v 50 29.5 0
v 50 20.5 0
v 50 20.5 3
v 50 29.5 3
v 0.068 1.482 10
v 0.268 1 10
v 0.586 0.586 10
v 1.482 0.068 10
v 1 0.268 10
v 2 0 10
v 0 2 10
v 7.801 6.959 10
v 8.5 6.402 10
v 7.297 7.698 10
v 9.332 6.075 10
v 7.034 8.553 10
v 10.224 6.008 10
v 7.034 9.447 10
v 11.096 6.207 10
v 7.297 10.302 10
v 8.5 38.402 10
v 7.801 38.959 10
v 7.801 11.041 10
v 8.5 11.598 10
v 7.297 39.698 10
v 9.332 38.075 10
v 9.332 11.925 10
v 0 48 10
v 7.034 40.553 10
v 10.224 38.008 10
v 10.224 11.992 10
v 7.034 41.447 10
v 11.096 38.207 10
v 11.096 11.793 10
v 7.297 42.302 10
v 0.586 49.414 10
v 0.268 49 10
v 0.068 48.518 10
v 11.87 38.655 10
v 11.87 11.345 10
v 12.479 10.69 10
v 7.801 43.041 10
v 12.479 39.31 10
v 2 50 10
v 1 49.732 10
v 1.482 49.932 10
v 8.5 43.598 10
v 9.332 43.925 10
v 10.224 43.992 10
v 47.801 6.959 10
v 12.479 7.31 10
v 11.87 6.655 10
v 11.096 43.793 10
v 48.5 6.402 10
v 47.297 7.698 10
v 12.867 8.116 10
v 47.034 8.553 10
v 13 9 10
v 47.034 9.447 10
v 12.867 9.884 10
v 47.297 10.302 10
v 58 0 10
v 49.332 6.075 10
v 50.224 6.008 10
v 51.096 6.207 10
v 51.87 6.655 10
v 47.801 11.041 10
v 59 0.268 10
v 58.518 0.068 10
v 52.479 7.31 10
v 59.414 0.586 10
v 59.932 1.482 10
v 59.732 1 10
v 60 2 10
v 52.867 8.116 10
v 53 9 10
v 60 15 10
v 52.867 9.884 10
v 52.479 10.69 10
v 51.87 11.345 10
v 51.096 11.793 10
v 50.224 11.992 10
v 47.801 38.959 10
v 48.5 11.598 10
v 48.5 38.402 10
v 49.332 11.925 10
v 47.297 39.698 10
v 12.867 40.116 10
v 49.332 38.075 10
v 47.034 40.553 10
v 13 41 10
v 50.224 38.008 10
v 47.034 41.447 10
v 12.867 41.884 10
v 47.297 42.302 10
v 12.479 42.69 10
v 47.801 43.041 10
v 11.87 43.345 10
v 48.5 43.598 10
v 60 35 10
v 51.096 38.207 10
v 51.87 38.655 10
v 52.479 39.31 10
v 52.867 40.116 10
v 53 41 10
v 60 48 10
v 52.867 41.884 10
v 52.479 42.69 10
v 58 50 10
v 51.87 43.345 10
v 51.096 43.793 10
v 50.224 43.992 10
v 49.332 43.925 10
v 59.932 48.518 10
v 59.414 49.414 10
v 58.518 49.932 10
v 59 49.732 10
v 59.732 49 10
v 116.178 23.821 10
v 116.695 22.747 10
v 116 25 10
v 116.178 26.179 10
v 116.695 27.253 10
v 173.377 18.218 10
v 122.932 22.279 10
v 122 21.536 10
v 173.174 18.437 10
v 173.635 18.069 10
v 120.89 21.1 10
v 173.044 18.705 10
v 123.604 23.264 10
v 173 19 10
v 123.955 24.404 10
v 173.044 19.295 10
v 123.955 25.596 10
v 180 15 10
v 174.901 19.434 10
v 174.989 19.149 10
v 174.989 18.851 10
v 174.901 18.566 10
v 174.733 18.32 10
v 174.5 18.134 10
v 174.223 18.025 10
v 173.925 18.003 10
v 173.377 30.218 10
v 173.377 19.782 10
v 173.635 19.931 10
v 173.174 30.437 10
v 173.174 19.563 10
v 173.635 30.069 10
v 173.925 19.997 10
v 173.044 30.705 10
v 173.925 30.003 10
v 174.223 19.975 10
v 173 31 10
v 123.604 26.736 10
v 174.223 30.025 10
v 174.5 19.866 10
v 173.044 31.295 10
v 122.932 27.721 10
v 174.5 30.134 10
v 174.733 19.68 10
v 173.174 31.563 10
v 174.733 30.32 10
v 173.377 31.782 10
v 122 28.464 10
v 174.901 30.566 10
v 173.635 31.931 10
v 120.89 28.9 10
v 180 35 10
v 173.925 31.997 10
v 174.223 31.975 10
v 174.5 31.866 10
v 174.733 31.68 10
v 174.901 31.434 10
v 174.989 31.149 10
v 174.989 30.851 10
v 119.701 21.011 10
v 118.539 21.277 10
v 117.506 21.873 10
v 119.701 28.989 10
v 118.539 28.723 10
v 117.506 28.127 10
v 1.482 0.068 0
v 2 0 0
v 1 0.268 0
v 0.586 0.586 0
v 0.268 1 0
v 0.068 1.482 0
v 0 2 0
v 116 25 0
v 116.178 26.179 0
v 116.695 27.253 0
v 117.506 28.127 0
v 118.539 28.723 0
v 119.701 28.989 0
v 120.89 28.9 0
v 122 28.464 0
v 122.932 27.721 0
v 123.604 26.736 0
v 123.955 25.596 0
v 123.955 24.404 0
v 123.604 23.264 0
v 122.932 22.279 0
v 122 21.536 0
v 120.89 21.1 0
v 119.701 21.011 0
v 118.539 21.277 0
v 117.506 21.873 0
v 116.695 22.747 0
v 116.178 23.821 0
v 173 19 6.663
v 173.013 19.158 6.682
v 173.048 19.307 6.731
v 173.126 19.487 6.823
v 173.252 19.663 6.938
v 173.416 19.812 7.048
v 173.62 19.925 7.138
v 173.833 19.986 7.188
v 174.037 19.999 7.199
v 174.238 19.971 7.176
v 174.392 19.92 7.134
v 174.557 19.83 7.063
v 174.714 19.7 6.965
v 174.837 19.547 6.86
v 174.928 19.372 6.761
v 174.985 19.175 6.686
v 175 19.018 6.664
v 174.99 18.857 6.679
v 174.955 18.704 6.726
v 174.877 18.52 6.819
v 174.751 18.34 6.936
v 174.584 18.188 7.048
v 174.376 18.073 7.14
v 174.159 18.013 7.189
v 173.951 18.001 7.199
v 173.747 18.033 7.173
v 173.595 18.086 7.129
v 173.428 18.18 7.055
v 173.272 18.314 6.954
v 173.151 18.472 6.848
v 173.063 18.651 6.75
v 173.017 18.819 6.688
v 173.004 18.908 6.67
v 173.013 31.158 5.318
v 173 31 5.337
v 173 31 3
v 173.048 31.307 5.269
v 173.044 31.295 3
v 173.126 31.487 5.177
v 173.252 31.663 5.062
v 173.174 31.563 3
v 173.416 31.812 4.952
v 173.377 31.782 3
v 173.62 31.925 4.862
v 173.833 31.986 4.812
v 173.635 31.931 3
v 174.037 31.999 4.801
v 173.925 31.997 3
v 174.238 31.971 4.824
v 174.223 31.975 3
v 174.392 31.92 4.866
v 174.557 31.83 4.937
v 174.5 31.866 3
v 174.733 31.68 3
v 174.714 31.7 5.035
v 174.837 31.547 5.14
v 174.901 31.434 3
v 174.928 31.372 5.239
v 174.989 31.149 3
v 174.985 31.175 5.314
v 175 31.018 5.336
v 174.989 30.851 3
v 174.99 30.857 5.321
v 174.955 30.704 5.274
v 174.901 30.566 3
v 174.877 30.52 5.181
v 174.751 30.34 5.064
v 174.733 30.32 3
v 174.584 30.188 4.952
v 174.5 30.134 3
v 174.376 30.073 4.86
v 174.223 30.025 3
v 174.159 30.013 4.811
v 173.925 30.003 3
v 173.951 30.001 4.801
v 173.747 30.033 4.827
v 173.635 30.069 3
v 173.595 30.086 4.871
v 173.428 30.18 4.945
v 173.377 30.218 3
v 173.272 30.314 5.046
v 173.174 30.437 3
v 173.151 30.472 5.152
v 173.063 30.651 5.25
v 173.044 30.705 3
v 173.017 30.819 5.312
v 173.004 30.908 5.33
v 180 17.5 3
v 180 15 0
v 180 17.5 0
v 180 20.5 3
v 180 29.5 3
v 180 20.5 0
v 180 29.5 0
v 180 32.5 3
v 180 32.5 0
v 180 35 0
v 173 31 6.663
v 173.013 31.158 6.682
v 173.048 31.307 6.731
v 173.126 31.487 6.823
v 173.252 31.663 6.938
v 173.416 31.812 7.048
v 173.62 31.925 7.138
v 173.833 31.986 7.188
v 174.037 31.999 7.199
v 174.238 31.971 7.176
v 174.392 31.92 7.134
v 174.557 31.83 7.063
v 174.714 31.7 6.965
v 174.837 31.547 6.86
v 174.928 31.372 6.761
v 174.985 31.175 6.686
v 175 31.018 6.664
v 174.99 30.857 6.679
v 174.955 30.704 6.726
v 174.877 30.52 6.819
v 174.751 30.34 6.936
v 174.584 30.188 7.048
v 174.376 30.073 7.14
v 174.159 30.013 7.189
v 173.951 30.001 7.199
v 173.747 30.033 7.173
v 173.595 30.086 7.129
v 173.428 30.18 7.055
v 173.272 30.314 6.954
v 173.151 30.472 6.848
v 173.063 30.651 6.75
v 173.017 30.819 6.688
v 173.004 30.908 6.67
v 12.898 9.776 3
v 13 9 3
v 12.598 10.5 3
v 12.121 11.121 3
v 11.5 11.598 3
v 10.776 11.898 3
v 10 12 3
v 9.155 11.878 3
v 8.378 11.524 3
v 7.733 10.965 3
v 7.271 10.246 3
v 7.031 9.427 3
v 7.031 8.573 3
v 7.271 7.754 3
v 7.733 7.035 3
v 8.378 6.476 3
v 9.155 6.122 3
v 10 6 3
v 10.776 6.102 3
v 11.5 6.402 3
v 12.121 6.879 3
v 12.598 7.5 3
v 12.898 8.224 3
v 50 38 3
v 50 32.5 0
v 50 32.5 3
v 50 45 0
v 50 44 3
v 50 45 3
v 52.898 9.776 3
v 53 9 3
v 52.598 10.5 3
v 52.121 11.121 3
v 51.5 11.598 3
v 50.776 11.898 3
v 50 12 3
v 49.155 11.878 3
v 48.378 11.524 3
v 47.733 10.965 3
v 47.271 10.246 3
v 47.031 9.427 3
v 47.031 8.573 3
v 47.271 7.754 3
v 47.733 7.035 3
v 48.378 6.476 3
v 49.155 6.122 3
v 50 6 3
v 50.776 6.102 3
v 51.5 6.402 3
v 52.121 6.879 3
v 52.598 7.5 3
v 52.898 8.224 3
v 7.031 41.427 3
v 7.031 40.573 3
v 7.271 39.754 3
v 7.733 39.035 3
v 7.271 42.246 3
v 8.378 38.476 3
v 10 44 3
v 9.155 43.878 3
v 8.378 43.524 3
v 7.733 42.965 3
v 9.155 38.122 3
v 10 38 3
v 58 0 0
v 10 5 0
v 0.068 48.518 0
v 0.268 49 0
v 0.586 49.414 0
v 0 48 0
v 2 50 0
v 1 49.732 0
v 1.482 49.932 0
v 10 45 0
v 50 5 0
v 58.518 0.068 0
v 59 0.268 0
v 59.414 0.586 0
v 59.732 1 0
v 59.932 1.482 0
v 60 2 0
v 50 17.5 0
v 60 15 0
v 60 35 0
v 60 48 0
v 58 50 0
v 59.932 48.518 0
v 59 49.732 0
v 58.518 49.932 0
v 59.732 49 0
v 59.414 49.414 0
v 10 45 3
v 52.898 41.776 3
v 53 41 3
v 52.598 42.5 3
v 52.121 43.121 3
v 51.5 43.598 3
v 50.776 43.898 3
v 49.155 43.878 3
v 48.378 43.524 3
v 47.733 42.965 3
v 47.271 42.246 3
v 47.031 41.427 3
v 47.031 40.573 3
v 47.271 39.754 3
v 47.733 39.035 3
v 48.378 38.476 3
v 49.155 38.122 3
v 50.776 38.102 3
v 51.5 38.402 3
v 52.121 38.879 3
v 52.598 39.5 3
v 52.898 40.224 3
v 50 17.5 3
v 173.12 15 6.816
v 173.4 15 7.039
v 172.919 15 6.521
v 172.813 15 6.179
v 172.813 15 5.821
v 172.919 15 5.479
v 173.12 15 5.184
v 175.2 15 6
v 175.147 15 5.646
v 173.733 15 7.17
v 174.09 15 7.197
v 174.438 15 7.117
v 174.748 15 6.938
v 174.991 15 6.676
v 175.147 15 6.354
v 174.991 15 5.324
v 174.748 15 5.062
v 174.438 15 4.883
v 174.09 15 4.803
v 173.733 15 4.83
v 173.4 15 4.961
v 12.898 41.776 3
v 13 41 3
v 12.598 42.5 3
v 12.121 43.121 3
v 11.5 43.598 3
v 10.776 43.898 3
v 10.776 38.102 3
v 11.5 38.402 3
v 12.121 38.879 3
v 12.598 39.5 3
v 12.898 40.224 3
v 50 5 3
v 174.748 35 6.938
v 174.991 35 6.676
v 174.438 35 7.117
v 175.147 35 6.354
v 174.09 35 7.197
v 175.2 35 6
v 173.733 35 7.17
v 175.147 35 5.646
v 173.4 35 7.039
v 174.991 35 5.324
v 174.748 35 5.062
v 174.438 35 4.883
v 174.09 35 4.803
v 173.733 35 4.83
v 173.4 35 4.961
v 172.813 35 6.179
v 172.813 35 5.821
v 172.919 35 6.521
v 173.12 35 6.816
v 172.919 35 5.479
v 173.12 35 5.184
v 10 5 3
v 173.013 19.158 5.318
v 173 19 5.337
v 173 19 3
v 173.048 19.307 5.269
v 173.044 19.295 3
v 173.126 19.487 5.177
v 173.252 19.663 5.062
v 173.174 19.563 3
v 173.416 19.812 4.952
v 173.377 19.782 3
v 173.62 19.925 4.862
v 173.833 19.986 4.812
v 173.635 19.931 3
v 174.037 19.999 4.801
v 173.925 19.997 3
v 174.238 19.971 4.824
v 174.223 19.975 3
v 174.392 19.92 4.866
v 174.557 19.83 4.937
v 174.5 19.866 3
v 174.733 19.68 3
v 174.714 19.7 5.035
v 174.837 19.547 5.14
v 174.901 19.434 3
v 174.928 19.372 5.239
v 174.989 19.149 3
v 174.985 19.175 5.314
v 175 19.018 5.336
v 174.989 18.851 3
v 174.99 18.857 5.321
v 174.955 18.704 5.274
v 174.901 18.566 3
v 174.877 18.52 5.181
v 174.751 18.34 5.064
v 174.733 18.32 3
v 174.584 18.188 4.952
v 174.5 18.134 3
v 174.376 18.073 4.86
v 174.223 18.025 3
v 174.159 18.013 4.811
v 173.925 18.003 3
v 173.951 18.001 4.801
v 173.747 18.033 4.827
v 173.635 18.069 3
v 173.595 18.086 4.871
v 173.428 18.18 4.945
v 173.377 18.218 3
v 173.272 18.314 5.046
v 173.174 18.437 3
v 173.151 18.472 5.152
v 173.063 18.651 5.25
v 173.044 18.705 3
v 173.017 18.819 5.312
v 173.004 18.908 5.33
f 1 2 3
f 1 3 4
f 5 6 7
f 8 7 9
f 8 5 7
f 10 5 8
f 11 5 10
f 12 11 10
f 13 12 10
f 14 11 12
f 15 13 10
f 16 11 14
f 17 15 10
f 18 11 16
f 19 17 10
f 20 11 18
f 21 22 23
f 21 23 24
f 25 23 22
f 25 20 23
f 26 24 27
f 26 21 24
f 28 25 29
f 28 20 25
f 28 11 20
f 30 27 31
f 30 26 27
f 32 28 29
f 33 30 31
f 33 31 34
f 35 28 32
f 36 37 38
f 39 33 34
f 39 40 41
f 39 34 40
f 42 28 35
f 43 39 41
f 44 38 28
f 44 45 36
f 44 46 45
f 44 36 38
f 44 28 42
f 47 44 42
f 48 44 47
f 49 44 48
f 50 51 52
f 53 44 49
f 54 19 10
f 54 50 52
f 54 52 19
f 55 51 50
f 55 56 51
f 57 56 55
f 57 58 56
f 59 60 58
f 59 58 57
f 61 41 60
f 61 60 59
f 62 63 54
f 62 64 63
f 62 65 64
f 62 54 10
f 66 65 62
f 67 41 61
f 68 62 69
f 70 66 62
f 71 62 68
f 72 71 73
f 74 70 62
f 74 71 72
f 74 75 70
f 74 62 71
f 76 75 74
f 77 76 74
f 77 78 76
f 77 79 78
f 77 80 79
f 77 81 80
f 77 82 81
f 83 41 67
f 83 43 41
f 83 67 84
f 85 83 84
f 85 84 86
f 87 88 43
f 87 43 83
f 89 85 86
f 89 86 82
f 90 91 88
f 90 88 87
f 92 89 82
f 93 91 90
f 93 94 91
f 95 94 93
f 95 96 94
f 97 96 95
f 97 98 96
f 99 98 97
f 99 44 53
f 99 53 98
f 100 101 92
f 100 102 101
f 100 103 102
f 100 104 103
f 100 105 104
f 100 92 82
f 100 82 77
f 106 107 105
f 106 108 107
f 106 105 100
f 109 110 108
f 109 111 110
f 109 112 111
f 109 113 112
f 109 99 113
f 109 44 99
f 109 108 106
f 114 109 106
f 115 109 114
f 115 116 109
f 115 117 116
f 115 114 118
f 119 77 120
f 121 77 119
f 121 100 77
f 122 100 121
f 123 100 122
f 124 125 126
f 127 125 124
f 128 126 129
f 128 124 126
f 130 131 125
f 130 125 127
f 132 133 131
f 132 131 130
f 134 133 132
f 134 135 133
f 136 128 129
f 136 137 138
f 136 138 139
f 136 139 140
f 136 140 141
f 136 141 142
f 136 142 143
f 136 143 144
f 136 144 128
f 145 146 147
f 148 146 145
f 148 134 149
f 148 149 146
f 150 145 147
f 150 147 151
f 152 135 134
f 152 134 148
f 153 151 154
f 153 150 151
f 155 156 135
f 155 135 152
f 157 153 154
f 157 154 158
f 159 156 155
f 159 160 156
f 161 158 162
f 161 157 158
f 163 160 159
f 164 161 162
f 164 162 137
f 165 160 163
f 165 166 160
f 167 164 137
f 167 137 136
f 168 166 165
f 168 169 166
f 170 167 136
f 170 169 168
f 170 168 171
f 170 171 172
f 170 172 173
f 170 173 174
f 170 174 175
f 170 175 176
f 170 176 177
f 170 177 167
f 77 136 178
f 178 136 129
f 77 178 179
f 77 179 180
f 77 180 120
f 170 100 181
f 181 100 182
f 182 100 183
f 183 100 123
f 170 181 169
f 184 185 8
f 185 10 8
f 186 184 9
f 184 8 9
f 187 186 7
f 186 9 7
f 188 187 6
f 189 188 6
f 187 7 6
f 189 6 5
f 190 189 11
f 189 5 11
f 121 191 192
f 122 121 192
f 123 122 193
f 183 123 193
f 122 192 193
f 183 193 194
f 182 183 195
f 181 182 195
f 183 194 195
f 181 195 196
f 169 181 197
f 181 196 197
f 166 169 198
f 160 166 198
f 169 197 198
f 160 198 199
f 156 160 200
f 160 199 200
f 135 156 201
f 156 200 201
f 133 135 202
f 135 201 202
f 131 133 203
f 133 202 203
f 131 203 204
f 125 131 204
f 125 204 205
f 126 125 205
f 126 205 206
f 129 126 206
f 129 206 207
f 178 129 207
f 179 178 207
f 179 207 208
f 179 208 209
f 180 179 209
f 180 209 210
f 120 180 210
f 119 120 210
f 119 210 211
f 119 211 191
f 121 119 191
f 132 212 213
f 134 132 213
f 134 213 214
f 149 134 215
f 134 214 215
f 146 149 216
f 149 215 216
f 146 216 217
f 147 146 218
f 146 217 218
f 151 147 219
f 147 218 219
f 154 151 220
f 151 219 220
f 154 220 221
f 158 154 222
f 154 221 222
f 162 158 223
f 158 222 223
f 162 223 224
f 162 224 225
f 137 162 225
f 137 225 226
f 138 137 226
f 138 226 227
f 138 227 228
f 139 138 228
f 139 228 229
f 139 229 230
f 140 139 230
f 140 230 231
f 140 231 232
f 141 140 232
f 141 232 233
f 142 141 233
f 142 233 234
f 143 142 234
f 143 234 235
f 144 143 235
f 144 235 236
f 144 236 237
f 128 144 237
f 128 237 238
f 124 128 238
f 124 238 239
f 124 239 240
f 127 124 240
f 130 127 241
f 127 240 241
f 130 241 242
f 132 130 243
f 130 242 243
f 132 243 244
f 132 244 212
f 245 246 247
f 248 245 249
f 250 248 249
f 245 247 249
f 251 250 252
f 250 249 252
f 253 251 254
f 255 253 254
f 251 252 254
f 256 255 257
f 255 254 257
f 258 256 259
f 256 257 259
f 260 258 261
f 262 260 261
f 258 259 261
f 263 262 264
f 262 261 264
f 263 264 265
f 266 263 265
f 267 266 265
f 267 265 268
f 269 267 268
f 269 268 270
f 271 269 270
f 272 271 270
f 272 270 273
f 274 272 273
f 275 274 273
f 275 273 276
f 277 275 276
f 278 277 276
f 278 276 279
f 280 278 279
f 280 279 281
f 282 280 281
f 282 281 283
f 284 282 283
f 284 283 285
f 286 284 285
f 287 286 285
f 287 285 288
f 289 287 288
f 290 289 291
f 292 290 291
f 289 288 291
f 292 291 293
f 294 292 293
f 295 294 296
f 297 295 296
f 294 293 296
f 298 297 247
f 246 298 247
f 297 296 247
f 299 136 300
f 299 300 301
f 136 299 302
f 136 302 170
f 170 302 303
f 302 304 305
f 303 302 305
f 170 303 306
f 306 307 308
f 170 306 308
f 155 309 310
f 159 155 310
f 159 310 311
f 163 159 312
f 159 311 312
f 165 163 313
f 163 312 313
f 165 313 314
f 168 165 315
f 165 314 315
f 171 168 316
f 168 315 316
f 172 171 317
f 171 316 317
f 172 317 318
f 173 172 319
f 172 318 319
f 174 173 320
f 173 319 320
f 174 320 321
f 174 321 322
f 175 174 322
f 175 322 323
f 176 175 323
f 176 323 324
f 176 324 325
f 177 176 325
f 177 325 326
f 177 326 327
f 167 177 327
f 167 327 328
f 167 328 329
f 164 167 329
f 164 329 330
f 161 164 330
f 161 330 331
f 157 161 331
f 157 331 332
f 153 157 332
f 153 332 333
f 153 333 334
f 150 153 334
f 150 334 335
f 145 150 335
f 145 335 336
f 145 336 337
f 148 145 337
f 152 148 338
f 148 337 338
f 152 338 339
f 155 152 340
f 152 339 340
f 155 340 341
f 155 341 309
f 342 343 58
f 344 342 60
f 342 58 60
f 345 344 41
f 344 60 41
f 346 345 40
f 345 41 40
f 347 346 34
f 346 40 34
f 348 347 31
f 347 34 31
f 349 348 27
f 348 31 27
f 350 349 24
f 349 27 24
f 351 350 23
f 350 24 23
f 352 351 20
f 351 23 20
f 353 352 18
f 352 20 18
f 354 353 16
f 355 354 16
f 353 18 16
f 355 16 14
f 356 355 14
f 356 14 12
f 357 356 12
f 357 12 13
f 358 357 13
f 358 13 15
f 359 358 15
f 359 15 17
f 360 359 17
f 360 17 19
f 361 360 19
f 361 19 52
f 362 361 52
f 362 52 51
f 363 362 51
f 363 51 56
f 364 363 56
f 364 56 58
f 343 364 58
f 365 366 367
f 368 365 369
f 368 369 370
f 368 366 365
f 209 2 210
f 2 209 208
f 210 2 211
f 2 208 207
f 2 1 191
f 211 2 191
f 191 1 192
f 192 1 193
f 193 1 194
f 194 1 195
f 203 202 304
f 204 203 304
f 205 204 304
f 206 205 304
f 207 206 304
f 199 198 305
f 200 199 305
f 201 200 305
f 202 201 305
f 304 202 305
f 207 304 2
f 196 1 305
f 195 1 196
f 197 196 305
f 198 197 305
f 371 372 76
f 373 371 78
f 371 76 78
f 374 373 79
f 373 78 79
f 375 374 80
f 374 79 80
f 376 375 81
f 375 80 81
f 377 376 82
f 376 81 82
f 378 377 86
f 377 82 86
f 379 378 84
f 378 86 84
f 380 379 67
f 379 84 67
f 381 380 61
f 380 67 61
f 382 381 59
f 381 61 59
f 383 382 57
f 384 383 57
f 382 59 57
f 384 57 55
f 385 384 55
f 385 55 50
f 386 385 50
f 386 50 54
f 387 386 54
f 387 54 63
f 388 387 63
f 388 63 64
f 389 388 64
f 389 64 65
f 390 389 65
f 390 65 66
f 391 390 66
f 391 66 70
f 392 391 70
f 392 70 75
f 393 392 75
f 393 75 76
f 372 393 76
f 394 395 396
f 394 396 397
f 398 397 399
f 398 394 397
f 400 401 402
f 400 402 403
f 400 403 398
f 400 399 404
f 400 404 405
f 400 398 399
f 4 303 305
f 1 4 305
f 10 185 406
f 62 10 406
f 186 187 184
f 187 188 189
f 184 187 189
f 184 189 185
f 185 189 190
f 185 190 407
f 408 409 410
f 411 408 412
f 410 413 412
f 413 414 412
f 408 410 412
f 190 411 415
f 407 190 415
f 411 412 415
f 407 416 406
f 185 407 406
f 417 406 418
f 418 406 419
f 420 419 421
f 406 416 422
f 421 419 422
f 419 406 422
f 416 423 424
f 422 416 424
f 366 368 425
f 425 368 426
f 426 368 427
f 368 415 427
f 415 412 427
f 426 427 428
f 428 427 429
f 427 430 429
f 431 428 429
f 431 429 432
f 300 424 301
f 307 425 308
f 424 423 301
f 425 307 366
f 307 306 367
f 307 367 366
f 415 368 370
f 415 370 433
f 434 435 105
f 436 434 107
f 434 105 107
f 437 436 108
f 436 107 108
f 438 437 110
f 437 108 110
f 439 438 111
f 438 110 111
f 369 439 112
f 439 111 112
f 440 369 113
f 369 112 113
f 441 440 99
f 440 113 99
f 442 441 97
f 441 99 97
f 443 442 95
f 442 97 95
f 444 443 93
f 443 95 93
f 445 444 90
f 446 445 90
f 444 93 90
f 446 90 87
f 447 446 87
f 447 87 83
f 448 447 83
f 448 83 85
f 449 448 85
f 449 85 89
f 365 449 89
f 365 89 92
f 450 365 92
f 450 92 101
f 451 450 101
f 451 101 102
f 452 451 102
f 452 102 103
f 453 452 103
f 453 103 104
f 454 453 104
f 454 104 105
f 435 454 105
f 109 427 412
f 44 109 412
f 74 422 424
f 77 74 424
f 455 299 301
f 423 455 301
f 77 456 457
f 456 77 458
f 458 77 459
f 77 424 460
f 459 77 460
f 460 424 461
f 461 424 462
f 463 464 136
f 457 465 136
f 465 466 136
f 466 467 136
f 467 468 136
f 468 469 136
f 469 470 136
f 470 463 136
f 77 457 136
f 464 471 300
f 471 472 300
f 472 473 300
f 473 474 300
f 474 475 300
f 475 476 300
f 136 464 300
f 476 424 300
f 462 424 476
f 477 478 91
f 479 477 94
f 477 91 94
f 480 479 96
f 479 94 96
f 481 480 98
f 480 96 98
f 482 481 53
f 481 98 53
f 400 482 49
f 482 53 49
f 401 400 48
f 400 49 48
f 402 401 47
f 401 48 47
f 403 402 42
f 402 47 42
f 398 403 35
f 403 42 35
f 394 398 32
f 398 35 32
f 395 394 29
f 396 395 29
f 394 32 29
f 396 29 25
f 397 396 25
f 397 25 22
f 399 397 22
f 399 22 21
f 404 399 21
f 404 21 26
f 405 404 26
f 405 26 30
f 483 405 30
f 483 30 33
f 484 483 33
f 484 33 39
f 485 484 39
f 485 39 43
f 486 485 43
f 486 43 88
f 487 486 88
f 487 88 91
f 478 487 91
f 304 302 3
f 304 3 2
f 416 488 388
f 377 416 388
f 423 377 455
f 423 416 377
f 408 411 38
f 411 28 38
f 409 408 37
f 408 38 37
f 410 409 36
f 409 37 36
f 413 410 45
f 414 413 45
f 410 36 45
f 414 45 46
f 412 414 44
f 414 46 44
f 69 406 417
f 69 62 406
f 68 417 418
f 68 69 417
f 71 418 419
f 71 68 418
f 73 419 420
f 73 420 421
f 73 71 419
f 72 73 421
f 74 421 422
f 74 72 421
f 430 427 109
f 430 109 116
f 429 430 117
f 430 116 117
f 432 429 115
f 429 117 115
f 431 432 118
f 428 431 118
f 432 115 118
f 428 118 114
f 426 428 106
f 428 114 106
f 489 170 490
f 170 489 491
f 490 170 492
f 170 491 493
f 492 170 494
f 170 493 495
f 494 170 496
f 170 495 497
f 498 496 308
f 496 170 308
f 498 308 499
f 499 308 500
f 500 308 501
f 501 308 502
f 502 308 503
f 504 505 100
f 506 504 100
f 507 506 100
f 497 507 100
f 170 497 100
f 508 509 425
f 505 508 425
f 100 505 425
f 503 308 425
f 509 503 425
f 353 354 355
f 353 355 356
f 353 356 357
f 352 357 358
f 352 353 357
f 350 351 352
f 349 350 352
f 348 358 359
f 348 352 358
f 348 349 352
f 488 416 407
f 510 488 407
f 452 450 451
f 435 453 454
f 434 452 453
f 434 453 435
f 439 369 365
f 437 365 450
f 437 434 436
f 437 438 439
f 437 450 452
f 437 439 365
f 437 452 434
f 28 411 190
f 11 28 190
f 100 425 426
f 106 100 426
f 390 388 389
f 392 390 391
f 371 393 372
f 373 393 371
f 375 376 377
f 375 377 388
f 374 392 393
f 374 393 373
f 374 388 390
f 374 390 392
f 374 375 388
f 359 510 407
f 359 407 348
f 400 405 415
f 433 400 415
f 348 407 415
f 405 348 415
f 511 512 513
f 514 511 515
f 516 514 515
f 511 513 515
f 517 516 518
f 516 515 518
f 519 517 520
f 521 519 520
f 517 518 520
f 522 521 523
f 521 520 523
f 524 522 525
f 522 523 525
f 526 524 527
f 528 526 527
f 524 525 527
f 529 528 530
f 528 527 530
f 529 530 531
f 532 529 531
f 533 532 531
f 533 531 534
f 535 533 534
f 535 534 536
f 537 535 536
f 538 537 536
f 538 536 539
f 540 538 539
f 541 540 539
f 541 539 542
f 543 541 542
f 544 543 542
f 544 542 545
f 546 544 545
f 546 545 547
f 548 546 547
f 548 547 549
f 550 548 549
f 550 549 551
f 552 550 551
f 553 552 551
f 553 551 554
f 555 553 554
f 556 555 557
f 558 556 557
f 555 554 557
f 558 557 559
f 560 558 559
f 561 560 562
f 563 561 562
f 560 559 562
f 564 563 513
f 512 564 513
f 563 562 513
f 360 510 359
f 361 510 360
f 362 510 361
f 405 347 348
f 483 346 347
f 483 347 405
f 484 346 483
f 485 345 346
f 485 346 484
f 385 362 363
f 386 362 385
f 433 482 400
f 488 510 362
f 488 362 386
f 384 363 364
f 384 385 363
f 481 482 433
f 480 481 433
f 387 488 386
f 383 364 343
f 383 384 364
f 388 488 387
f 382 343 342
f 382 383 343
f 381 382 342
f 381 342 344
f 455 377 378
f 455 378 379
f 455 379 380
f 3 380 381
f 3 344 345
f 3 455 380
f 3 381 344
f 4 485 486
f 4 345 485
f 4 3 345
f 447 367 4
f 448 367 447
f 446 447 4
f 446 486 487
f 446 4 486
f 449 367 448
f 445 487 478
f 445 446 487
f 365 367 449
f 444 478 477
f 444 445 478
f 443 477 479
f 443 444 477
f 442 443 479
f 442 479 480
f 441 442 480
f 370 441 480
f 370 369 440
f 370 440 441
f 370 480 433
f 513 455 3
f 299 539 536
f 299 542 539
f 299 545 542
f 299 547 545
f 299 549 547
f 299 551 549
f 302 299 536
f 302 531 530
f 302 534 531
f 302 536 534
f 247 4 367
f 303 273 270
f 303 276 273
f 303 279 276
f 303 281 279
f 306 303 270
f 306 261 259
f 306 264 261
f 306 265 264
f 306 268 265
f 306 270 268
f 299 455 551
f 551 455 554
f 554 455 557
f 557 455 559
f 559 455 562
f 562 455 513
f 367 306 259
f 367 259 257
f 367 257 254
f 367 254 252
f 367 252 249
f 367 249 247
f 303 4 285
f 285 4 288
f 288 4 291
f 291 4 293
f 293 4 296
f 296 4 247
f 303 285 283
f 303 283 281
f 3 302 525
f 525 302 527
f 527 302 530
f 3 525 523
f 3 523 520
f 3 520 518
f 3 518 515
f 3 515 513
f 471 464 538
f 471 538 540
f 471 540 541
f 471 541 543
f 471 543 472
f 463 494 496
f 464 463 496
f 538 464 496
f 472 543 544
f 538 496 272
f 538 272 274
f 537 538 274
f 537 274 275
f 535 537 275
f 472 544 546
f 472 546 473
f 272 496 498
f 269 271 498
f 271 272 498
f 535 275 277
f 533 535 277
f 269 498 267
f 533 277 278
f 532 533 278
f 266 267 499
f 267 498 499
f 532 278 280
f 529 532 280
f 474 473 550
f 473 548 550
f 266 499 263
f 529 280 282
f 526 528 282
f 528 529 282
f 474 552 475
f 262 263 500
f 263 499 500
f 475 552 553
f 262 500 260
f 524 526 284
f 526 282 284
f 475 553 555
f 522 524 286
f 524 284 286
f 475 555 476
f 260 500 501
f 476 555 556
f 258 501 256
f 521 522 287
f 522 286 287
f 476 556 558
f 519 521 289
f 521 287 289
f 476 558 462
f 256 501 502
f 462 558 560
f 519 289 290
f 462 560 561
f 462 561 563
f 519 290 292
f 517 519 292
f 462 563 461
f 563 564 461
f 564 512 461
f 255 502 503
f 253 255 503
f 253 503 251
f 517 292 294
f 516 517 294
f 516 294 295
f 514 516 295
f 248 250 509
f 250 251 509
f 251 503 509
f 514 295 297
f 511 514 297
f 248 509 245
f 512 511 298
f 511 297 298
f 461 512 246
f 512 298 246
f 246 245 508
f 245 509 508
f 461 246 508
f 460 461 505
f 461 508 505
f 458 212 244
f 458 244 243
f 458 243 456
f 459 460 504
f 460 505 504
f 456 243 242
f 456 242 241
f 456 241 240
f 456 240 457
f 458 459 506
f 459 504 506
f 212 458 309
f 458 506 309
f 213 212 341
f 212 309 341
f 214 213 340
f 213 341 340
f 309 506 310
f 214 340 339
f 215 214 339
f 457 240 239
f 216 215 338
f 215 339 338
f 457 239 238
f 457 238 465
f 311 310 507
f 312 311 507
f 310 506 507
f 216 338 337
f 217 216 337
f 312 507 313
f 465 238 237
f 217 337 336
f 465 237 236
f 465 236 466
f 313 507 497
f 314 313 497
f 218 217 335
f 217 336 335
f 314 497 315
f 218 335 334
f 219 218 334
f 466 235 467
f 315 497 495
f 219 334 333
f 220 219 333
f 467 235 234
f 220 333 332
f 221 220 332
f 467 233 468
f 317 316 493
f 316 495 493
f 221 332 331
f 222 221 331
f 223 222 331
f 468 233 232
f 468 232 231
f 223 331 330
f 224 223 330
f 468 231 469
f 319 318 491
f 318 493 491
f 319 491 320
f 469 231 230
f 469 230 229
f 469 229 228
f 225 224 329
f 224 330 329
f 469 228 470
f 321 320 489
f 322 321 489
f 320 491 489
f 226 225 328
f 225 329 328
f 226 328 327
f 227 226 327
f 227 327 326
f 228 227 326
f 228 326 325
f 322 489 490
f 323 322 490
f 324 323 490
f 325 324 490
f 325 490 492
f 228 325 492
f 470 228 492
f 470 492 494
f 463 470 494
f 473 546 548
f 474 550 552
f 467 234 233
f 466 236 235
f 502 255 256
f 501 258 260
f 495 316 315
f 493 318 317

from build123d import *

# Parameters (mm, degrees)
BOSS_EXTRUDE1_DEPTH = 10
SKETCH2_R           = 3
CUT_EXTRUDE1_DEPTH  = 7
SKETCH4_W           = 40
SKETCH4_H           = 40
CUT_EXTRUDE3_DEPTH  = 3
SKETCH5_R           = 1
SKETCH5_R_2         = 4
CUT_EXTRUDE4_DEPTH  = 11
SKETCH6_W           = 3
SKETCH6_H           = 3
CUT_EXTRUDE5_DEPTH  = 130
FILLET1_R           = 2
SKETCH7_R           = 1.2
CUT_EXTRUDE6_DEPTH  = 36


with BuildPart() as part:
    # Sketch1 → Boss-Extrude1 (new body)
    with BuildSketch(Plane.XY):
        Polygon((0, 0), (60, 0), (60, 15), (180, 15), (180, 35), (60, 35), (60, 50), (0, 50), align=None)
    extrude(amount=BOSS_EXTRUDE1_DEPTH)

    # Sketch2 → Cut-Extrude1 (cut)
    with BuildSketch(Plane.XY.offset(10)):
        with Locations((10, 9)):
            Circle(SKETCH2_R)
        with Locations((50, 9)):
            Circle(SKETCH2_R)
        with Locations((50, 41)):
            Circle(SKETCH2_R)
        with Locations((10, 41)):
            Circle(SKETCH2_R)
    extrude(amount=-CUT_EXTRUDE1_DEPTH, mode=Mode.SUBTRACT)

    # Sketch4 → Cut-Extrude3 (cut)
    with BuildSketch(Plane(origin=(0, 0, 0), x_dir=(-1, 0, 0), z_dir=(0, 0, -1))):
        with Locations((-30, 25)):
            Rectangle(SKETCH4_W, SKETCH4_H)
    extrude(amount=-CUT_EXTRUDE3_DEPTH, mode=Mode.SUBTRACT)

    # Sketch5 → Cut-Extrude4 (cut, through all)
    with BuildSketch(Plane(origin=(0, 0, 0), x_dir=(-1, 0, 0), z_dir=(0, 0, -1))):
        with Locations((-174, 31)):
            Circle(SKETCH5_R)
        with Locations((-174, 19)):
            Circle(SKETCH5_R)
        with Locations((-120, 25)):
            Circle(SKETCH5_R_2)
    extrude(amount=-CUT_EXTRUDE4_DEPTH, mode=Mode.SUBTRACT)

    # Sketch6 → Cut-Extrude5 (cut)
    with BuildSketch(Plane(origin=(180, 0, 0), x_dir=(0, 0, -1), z_dir=(1, 0, 0))):
        with Locations((-1.5, 31)):
            Rectangle(SKETCH6_W, SKETCH6_H)
        with Locations((-1.5, 19)):
            Rectangle(SKETCH6_W, SKETCH6_H)
    extrude(amount=-CUT_EXTRUDE5_DEPTH, mode=Mode.SUBTRACT)

    # Fillet1
    fillet1_edges = [part.edges().sort_by_distance(p)[0] for p in [
        (0, 50, 5),
        (60, 50, 5),
        (60, 0, 5),
        (0, 0, 5),
    ]]
    fillet(fillet1_edges, radius=FILLET1_R)

    # Sketch7 → Cut-Extrude6 (cut, through all)
    with BuildSketch(Plane(origin=(0, 35, 0), x_dir=(1, 0, 0), z_dir=(0, 1, 0))):
        with Locations((174, -6)):
            Circle(SKETCH7_R)
    extrude(amount=-CUT_EXTRUDE6_DEPTH, mode=Mode.SUBTRACT)


solid = part.part
